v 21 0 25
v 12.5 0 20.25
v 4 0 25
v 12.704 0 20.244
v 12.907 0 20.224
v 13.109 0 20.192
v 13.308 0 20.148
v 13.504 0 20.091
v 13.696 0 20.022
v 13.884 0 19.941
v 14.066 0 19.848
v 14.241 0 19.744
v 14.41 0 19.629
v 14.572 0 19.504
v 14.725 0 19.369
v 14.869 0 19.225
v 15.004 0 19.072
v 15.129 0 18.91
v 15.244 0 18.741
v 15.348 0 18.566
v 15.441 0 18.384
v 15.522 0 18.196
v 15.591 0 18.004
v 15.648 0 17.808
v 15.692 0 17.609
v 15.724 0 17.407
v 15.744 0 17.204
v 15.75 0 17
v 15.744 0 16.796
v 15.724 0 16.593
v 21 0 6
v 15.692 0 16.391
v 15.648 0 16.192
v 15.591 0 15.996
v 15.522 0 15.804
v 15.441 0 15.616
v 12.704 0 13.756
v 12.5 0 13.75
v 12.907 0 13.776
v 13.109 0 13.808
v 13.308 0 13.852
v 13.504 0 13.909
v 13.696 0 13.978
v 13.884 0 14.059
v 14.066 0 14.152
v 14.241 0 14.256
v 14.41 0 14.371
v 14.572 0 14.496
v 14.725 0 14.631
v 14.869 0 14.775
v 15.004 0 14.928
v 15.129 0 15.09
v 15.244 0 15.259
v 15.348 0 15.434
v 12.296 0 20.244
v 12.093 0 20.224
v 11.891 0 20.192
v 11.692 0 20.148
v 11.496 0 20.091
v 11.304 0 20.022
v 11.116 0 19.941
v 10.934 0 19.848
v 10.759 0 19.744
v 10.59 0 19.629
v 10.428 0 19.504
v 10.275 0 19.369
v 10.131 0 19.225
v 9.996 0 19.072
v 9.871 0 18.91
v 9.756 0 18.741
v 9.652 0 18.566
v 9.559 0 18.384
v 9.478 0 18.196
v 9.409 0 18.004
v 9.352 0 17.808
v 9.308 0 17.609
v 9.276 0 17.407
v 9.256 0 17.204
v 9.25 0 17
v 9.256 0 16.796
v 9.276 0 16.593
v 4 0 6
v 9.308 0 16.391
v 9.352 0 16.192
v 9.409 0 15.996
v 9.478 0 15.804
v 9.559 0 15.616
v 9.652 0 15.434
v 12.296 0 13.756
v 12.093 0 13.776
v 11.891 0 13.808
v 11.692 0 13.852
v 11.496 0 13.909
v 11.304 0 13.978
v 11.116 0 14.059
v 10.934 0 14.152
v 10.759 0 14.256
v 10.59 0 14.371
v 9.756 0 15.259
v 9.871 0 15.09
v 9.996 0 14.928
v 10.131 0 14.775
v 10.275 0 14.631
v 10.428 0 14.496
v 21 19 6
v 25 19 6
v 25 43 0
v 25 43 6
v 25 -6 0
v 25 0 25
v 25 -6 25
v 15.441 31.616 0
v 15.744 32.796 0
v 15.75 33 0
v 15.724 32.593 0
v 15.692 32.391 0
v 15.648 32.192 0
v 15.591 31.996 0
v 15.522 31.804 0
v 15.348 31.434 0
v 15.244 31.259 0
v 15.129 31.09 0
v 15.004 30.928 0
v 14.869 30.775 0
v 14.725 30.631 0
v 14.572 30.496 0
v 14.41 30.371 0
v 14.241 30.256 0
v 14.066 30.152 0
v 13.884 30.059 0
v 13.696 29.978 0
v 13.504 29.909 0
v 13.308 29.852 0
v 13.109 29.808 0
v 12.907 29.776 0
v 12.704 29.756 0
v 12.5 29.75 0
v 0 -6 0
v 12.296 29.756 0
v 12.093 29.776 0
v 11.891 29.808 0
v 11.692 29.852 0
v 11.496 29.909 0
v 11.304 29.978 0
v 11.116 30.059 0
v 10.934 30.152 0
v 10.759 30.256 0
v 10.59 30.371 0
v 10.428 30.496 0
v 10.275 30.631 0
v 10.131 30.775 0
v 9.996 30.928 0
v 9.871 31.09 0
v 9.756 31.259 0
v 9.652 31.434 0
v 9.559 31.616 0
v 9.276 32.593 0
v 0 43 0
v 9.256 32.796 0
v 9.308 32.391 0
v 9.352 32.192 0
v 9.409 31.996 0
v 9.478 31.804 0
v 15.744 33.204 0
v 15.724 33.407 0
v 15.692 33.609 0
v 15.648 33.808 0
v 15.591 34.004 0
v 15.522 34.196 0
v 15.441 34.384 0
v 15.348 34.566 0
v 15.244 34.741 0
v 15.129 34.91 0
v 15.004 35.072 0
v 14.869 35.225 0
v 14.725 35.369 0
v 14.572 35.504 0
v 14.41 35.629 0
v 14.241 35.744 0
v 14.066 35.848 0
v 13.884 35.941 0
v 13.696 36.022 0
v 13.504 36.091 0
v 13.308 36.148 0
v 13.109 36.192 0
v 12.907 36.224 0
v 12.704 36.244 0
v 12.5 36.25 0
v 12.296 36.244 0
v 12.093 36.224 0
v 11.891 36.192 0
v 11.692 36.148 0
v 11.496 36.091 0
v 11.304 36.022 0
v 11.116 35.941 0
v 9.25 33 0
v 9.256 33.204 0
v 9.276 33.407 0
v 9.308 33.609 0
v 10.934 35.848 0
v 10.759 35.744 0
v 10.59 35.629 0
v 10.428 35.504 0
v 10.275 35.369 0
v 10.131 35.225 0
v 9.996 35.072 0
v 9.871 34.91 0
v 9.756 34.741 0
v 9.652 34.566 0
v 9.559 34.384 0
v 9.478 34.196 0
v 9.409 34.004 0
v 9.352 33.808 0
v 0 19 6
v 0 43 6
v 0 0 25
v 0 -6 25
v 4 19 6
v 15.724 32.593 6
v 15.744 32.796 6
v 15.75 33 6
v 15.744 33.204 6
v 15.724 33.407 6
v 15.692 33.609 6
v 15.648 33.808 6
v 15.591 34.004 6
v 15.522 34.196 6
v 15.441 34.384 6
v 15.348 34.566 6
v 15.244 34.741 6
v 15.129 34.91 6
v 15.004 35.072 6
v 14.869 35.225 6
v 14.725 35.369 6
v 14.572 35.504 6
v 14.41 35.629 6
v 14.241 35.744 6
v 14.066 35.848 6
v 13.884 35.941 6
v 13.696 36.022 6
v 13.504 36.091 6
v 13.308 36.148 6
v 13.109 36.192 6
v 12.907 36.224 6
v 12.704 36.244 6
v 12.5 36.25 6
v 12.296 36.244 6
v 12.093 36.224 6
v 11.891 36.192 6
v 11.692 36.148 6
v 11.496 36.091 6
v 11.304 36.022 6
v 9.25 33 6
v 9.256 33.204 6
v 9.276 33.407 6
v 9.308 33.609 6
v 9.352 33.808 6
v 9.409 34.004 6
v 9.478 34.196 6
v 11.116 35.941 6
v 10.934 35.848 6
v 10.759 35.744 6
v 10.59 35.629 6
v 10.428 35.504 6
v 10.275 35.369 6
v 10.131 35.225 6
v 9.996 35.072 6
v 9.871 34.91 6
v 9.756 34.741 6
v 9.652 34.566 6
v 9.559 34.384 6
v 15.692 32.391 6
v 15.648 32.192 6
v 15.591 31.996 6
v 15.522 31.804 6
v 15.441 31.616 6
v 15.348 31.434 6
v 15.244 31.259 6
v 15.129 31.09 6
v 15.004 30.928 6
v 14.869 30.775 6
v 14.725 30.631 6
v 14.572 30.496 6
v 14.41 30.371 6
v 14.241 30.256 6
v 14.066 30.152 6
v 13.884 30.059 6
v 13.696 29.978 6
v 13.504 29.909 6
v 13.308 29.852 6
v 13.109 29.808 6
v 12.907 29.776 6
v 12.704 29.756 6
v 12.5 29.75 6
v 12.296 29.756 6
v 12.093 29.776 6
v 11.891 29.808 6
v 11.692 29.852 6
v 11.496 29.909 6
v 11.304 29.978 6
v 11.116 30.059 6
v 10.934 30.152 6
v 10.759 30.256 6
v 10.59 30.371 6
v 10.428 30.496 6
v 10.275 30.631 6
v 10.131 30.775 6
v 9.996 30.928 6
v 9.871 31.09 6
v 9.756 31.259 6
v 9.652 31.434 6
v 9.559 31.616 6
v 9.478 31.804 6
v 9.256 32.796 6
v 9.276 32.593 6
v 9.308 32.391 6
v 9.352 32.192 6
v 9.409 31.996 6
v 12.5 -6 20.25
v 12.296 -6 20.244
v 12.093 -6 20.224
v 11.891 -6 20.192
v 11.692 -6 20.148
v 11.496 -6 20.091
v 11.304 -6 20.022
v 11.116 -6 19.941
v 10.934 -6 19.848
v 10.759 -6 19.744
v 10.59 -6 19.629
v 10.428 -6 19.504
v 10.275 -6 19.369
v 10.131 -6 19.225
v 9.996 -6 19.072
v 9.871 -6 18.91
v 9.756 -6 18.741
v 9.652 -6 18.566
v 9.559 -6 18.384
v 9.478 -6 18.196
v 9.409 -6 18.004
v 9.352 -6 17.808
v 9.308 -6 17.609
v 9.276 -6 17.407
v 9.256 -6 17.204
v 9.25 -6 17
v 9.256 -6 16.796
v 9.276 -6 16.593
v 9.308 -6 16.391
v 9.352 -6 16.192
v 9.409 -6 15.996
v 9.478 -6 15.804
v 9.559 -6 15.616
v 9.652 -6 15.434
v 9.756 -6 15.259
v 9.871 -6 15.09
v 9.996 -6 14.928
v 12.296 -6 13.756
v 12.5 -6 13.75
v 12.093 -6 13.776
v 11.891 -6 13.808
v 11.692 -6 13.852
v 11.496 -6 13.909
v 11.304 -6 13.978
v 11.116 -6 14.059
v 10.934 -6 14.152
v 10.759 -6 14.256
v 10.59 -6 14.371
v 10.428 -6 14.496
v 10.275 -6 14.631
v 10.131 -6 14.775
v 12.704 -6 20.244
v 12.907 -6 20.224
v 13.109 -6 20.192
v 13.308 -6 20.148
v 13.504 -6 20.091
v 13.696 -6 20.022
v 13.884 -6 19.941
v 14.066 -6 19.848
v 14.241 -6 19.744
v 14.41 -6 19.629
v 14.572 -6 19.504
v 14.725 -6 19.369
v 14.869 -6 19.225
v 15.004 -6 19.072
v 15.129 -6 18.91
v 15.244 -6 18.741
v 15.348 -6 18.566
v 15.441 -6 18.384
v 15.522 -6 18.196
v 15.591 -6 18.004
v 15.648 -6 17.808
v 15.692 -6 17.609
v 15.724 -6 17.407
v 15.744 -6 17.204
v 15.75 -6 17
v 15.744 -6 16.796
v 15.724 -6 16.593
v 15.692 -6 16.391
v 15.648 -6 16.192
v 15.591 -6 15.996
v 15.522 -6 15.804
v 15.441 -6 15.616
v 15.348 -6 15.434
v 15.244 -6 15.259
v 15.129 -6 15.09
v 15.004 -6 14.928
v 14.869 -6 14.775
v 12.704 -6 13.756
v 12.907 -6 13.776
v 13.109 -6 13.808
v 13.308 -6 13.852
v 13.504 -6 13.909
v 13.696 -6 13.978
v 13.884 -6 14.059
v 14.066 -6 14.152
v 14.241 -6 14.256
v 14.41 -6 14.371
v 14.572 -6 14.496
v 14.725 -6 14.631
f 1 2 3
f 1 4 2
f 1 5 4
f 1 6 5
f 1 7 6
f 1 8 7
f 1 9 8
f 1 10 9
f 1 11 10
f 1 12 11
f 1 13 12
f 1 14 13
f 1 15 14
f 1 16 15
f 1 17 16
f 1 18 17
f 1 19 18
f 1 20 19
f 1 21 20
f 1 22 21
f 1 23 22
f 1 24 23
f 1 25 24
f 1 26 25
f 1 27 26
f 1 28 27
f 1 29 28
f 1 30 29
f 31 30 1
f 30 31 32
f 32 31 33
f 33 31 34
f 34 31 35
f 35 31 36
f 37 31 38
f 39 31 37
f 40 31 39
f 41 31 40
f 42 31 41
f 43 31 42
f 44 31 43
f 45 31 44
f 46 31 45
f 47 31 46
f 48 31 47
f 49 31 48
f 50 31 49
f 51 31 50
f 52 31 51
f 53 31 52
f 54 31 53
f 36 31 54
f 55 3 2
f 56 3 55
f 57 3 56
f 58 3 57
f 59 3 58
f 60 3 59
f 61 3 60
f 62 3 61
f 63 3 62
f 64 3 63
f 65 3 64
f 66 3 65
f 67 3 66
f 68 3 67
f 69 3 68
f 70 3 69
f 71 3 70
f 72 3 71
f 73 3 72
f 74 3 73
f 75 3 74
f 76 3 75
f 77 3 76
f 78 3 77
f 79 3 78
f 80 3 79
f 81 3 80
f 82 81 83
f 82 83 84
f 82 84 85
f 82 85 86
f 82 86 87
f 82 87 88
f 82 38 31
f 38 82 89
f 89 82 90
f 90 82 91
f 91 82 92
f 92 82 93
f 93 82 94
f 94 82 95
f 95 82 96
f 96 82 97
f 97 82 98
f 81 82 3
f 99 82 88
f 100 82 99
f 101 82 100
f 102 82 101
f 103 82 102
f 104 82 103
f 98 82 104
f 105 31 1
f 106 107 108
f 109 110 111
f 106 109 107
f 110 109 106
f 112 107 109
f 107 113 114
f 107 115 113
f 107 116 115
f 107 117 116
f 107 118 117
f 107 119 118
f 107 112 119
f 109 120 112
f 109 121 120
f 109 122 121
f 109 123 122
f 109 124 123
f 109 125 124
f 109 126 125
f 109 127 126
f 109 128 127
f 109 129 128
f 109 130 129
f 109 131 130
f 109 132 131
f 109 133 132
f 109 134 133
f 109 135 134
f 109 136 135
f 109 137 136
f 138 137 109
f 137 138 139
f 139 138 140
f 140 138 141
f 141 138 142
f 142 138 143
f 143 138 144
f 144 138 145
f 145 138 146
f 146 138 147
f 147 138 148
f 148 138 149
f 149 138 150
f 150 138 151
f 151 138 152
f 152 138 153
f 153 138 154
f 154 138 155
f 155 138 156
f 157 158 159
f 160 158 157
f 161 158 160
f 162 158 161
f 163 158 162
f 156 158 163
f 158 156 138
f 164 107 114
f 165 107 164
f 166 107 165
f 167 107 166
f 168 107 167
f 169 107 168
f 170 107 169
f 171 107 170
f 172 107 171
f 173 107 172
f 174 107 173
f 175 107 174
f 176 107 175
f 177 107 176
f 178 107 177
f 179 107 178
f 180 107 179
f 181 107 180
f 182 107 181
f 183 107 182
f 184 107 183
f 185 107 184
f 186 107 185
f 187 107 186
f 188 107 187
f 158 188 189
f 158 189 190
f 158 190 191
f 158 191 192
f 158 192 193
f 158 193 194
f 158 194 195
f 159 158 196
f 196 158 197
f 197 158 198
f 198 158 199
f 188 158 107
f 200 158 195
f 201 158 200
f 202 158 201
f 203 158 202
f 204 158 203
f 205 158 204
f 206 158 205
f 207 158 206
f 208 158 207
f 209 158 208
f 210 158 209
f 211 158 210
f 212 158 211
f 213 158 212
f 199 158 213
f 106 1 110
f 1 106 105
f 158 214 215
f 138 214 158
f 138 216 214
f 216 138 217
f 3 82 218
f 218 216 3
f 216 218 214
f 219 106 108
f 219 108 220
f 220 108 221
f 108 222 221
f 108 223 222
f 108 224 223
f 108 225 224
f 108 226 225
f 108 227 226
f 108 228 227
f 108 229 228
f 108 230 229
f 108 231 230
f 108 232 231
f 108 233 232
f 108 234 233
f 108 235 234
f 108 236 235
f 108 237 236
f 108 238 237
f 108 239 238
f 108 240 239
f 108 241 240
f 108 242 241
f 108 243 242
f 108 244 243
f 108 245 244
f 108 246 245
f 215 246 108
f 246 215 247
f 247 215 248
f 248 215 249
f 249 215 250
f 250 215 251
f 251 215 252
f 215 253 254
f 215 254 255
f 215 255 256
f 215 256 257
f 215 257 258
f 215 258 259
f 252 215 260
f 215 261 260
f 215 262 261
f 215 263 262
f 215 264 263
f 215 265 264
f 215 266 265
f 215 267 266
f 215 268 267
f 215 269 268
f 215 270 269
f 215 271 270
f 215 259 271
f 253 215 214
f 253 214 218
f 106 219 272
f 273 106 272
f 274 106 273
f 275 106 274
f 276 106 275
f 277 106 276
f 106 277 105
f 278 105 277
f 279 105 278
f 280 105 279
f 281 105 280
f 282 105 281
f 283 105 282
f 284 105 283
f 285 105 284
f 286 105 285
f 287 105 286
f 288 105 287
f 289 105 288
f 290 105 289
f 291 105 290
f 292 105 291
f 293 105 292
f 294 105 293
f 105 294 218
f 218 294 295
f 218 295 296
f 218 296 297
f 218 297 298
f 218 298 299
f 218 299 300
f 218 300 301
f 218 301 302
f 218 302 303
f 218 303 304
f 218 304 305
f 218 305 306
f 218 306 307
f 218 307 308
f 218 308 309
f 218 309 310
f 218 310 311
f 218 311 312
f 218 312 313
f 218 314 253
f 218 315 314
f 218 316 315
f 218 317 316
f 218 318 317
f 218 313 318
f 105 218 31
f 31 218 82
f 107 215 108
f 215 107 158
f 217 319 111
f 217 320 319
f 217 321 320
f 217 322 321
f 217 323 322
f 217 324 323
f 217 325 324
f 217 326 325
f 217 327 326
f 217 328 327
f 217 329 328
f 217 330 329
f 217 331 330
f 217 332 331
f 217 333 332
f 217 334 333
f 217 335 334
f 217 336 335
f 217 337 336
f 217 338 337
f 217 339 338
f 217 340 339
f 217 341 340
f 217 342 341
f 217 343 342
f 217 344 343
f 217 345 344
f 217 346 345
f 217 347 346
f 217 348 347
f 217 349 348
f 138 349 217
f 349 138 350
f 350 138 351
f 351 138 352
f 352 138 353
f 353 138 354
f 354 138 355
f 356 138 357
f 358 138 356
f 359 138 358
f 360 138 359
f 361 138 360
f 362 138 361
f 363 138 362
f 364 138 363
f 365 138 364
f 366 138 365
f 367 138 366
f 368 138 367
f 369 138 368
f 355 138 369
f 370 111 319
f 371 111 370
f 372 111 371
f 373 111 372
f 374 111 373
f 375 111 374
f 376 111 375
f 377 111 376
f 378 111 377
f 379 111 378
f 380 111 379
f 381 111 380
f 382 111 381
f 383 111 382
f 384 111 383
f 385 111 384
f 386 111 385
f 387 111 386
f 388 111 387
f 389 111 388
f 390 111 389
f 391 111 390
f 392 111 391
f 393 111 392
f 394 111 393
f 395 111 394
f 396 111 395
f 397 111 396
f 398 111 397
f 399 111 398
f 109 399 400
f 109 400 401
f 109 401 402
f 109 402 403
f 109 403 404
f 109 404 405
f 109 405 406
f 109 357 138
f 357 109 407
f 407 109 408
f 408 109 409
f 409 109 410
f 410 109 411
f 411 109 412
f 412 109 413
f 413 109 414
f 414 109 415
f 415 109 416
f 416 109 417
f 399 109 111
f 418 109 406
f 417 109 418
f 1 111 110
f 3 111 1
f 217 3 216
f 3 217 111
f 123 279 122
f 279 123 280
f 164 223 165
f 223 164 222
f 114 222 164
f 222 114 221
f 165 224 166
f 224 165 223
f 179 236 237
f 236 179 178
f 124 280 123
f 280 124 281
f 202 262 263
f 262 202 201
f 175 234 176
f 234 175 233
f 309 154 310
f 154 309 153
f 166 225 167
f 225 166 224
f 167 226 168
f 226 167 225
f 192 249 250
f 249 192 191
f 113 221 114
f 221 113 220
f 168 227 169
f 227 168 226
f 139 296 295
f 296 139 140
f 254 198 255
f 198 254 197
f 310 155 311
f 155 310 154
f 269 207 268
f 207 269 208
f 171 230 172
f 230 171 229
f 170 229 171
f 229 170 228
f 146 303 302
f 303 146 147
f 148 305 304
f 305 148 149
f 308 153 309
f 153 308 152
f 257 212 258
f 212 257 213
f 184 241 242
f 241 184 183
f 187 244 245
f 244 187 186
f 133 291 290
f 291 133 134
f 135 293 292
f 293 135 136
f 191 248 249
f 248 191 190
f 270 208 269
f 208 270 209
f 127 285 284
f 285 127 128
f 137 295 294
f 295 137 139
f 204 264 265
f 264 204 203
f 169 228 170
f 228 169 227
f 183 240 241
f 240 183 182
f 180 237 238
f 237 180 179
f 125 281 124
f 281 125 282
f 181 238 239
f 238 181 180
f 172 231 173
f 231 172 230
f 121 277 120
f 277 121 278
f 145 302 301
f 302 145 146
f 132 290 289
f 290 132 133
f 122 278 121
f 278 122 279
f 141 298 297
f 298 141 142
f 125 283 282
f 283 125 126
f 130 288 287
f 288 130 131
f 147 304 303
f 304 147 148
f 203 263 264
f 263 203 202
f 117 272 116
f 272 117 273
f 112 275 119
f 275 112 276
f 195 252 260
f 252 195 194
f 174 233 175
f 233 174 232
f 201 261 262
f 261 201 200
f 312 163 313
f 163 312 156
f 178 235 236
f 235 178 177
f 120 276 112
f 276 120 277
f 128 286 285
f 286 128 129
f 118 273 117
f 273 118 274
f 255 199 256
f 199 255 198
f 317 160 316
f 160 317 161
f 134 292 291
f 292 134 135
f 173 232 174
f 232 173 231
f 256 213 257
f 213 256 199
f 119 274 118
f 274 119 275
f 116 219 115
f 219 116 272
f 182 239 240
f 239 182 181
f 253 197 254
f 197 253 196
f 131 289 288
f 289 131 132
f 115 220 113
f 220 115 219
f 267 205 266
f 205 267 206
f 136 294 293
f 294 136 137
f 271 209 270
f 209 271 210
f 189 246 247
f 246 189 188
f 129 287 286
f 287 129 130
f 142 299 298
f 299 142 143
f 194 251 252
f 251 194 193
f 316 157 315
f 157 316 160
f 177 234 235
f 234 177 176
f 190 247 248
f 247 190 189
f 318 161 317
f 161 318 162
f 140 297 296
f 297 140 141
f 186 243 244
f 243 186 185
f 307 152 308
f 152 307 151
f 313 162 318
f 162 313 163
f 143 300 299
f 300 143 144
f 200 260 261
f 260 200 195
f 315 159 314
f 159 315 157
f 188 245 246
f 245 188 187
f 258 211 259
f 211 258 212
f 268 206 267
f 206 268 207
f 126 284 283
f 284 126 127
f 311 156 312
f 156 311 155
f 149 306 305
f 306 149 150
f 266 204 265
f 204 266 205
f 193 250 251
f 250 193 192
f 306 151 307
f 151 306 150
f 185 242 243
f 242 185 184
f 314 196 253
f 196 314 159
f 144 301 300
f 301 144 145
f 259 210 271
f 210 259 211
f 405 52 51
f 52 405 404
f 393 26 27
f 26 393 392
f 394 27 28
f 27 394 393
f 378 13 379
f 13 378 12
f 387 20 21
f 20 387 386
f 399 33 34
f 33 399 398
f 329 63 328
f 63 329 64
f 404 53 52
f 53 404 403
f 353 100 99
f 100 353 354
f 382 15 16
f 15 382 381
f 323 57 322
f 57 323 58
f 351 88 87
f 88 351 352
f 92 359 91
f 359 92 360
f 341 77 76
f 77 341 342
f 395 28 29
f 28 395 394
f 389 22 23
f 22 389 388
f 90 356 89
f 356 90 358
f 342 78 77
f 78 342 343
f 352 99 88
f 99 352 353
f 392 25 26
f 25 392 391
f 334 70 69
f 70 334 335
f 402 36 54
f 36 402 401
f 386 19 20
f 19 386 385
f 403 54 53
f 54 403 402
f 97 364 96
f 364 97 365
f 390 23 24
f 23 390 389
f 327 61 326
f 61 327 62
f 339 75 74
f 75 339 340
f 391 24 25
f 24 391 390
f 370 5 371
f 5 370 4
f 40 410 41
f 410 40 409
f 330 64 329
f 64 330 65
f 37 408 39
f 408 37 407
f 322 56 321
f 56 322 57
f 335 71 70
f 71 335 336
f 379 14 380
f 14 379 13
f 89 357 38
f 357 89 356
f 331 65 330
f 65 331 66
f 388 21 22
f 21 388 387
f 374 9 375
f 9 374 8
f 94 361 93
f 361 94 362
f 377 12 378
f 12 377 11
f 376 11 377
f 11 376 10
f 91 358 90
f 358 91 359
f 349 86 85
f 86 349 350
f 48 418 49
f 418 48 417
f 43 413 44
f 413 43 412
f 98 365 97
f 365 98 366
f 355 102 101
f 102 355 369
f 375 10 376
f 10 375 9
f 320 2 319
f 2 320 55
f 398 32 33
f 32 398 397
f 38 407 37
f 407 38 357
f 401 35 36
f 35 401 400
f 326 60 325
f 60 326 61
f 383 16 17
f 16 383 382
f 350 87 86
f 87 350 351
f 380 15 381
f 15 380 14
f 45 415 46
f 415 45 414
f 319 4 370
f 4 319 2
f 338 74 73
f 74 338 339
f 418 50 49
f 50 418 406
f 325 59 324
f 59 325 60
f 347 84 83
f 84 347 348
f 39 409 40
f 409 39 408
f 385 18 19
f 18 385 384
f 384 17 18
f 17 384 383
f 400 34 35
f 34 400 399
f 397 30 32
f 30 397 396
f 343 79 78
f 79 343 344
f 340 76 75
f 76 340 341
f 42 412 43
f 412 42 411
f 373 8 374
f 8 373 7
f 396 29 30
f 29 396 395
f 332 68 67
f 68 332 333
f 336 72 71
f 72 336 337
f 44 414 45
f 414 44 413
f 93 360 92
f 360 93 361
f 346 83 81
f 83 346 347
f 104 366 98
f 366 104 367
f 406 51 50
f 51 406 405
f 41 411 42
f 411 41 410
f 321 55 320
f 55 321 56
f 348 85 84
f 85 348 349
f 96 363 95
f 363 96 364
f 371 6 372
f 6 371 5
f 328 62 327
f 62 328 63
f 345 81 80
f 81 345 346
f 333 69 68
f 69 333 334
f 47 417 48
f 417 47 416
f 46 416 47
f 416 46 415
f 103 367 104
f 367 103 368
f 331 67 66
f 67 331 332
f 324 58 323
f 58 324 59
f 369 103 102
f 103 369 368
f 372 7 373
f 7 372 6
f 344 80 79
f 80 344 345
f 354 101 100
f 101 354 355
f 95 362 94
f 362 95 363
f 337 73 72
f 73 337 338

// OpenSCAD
// thickness of braces
bracethick=4;  
// width of clamp
width=25;  
// length of clamp
length=43;  
// clamp thickness
clampthick=6;  
// offset of hole from edge
holeoffset=10;  
// radius of hole
holeradius=3.25; 
// hole #2 offset (-1 for no hole)
hole2offset=8; 
// radius of hole 2
hole2radius=3.25; 

$fn=100-0;  // round holes please

bracesize=width;  // brace width and height


module brace() {
    rotate([90,0,-90,])difference() {
        cube([bracesize,bracesize,bracethick]);
    rotate([0,0,45])
        translate([0,0,-1]) cube([2*bracesize,2*bracesize,bracethick*2]);
    }
}



difference() {
union() {
     cube([width,length,clampthick]);
    rotate([90,0,0])
      cube([width,width,clampthick]);
    translate([width,bracesize,0]) brace();
    translate([bracethick,bracesize,0])
    brace();   
   }
translate([width/2,
   length-holeoffset,-1])  
   cylinder(r=holeradius,h=clampthick*10);
    if (hole2offset>=0)
    {
        translate([width/2,1,width-hole2offset])
rotate ([90,0,0]) 
        
        cylinder(r=hole2radius,h=clampthick*10);
    }
}
